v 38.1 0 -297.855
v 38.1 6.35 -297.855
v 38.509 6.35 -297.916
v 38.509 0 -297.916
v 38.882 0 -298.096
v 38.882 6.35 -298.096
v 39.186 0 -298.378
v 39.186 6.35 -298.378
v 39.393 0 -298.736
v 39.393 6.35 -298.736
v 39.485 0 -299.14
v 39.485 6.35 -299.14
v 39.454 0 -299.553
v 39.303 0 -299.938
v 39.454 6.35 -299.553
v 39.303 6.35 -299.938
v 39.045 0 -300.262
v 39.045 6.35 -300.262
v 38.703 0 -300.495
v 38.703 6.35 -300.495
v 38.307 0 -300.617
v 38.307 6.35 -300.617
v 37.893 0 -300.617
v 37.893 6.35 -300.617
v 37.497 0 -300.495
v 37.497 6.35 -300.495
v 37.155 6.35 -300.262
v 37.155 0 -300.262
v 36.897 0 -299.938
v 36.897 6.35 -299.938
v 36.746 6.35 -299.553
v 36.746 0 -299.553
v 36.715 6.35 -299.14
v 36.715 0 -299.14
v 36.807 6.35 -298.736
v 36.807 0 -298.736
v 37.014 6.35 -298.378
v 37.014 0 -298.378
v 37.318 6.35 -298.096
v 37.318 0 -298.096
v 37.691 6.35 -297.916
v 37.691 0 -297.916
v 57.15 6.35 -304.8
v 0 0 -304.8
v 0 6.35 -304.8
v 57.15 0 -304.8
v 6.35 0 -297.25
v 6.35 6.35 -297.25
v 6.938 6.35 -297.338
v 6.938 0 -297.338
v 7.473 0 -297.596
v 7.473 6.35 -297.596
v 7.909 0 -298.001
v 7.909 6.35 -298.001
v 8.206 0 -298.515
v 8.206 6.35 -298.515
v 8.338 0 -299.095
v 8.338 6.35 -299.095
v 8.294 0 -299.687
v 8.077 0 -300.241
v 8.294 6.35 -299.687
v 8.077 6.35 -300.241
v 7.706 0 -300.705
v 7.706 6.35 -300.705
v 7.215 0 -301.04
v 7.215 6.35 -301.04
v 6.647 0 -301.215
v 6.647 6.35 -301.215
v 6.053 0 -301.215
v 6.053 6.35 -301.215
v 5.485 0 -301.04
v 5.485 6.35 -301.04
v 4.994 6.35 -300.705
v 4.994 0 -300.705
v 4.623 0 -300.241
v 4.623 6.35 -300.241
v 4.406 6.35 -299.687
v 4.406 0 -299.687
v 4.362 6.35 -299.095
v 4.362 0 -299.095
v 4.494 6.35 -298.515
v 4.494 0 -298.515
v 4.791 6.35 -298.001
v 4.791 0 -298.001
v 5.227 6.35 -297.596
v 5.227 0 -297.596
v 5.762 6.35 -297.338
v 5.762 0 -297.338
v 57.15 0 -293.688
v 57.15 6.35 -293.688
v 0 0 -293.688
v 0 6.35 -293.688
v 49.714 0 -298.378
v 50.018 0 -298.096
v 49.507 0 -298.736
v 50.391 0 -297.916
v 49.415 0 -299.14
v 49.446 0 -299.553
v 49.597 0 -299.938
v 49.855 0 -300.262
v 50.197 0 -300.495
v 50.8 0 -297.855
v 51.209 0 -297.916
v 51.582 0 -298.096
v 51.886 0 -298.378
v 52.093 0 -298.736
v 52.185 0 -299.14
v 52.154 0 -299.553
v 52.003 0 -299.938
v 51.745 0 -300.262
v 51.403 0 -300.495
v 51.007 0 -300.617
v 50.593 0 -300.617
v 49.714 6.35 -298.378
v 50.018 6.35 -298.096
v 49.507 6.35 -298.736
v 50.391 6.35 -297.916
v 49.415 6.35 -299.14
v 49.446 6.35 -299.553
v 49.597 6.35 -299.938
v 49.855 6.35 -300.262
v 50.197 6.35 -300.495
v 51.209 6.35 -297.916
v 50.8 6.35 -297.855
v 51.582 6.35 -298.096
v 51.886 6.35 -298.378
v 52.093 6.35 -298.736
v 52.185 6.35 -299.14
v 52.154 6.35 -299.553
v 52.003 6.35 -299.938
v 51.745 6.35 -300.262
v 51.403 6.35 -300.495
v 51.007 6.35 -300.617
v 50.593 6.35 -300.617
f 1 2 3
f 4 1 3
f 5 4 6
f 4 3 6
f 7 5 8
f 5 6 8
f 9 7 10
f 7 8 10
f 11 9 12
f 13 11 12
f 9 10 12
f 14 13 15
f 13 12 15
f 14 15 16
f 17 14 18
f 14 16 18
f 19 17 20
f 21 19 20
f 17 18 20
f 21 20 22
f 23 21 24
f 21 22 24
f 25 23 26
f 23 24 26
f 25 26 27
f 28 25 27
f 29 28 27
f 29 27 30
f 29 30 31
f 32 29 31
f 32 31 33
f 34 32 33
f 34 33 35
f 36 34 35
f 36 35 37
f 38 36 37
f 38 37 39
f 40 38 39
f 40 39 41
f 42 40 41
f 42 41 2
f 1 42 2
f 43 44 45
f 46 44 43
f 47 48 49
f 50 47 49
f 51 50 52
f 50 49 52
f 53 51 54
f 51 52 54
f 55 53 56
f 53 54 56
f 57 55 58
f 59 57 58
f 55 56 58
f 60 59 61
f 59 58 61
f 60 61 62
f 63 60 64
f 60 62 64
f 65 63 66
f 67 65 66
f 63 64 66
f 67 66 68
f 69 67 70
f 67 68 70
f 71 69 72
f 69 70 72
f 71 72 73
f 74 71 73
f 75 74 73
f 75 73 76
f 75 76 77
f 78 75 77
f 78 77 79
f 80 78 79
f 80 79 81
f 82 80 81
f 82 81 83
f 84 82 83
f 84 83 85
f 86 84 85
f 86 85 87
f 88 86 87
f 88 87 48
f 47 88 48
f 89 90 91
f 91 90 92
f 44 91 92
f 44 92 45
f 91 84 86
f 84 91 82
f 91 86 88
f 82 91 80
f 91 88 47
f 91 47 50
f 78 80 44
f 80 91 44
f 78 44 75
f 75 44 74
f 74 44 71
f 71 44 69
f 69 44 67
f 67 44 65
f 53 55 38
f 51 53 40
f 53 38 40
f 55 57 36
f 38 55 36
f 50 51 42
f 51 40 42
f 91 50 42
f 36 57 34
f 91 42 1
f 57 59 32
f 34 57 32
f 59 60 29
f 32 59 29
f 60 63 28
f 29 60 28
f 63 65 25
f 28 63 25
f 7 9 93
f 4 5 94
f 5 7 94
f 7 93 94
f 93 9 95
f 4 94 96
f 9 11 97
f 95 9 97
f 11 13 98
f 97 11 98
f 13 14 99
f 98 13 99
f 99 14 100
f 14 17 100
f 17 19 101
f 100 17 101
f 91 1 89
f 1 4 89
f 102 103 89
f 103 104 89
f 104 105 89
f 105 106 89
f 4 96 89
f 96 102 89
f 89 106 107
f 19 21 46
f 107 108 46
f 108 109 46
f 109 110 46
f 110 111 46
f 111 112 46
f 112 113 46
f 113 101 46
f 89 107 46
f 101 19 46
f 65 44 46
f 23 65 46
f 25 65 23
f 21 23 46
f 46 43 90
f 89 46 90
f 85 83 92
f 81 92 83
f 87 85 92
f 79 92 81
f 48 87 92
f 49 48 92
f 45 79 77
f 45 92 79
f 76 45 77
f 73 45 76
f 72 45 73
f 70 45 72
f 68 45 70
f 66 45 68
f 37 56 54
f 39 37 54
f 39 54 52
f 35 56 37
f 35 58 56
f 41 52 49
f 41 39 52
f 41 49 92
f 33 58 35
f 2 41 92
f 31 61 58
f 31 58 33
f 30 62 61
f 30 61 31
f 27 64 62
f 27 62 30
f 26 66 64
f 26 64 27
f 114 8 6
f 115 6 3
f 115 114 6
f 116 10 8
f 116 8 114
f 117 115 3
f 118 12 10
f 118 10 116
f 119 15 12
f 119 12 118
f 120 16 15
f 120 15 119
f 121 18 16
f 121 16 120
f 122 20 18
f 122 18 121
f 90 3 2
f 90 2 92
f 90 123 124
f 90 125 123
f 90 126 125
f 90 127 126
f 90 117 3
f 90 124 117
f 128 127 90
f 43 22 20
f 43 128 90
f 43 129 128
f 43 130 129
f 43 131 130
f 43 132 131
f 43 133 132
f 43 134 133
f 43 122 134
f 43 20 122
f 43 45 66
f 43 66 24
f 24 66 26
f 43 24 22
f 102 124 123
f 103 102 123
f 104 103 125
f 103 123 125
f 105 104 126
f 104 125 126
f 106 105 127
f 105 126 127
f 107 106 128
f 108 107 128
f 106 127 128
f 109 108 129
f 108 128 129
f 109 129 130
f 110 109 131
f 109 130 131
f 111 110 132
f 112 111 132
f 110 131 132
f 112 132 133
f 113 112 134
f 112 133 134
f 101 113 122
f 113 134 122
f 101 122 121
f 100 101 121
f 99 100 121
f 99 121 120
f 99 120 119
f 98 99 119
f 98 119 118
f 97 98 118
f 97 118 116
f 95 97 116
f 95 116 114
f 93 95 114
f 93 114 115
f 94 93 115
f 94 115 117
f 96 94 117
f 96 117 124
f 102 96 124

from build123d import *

# Parameters (mm, degrees)
SKETCH1_W           = 304.8
SKETCH1_H           = 304.8
BOSS_EXTRUDE1_DEPTH = 6.35
CUT_EXTRUDE2_DEPTH  = 6.35
SKETCH3_R           = 1.9939
SKETCH3_R_2         = 1.3890625
CUT_EXTRUDE3_DEPTH  = 311.176538442


with BuildPart() as part:
    # Sketch1 → Boss-Extrude1 (new body)
    with BuildSketch(Plane(origin=(0, 0, 0), x_dir=(1, 0, 0), z_dir=(0, 1, 0))):
        with Locations((152.4, 152.4)):
            Rectangle(SKETCH1_W, SKETCH1_H)
    extrude(amount=BOSS_EXTRUDE1_DEPTH)

    # Sketch2 → Cut-Extrude2 (cut)
    with BuildSketch(Plane(origin=(0, 6.35, 0), x_dir=(1, 0, 0), z_dir=(0, 1, 0))):
        Polygon((57.15, 304.8), (57.15, 293.6875), (0, 293.6875), (0, 0), (304.8, 0), (304.8, 304.8), align=None)
    extrude(amount=-CUT_EXTRUDE2_DEPTH, mode=Mode.SUBTRACT)

    # Sketch3 → Cut-Extrude3 (cut, through all)
    with BuildSketch(Plane(origin=(0, 6.35, 0), x_dir=(1, 0, 0), z_dir=(0, 1, 0))):
        with Locations(Location((6.35, 299.24375, 0), (0, 0, 270))):
            Circle(SKETCH3_R)
        with Locations(Location((50.8, 299.24375, 0), (0, 0, 270))):
            Circle(SKETCH3_R_2)
        with Locations(Location((38.1, 299.24375, 0), (0, 0, 270))):
            Circle(SKETCH3_R_2)
    extrude(amount=-CUT_EXTRUDE3_DEPTH, mode=Mode.SUBTRACT)


solid = part.part
